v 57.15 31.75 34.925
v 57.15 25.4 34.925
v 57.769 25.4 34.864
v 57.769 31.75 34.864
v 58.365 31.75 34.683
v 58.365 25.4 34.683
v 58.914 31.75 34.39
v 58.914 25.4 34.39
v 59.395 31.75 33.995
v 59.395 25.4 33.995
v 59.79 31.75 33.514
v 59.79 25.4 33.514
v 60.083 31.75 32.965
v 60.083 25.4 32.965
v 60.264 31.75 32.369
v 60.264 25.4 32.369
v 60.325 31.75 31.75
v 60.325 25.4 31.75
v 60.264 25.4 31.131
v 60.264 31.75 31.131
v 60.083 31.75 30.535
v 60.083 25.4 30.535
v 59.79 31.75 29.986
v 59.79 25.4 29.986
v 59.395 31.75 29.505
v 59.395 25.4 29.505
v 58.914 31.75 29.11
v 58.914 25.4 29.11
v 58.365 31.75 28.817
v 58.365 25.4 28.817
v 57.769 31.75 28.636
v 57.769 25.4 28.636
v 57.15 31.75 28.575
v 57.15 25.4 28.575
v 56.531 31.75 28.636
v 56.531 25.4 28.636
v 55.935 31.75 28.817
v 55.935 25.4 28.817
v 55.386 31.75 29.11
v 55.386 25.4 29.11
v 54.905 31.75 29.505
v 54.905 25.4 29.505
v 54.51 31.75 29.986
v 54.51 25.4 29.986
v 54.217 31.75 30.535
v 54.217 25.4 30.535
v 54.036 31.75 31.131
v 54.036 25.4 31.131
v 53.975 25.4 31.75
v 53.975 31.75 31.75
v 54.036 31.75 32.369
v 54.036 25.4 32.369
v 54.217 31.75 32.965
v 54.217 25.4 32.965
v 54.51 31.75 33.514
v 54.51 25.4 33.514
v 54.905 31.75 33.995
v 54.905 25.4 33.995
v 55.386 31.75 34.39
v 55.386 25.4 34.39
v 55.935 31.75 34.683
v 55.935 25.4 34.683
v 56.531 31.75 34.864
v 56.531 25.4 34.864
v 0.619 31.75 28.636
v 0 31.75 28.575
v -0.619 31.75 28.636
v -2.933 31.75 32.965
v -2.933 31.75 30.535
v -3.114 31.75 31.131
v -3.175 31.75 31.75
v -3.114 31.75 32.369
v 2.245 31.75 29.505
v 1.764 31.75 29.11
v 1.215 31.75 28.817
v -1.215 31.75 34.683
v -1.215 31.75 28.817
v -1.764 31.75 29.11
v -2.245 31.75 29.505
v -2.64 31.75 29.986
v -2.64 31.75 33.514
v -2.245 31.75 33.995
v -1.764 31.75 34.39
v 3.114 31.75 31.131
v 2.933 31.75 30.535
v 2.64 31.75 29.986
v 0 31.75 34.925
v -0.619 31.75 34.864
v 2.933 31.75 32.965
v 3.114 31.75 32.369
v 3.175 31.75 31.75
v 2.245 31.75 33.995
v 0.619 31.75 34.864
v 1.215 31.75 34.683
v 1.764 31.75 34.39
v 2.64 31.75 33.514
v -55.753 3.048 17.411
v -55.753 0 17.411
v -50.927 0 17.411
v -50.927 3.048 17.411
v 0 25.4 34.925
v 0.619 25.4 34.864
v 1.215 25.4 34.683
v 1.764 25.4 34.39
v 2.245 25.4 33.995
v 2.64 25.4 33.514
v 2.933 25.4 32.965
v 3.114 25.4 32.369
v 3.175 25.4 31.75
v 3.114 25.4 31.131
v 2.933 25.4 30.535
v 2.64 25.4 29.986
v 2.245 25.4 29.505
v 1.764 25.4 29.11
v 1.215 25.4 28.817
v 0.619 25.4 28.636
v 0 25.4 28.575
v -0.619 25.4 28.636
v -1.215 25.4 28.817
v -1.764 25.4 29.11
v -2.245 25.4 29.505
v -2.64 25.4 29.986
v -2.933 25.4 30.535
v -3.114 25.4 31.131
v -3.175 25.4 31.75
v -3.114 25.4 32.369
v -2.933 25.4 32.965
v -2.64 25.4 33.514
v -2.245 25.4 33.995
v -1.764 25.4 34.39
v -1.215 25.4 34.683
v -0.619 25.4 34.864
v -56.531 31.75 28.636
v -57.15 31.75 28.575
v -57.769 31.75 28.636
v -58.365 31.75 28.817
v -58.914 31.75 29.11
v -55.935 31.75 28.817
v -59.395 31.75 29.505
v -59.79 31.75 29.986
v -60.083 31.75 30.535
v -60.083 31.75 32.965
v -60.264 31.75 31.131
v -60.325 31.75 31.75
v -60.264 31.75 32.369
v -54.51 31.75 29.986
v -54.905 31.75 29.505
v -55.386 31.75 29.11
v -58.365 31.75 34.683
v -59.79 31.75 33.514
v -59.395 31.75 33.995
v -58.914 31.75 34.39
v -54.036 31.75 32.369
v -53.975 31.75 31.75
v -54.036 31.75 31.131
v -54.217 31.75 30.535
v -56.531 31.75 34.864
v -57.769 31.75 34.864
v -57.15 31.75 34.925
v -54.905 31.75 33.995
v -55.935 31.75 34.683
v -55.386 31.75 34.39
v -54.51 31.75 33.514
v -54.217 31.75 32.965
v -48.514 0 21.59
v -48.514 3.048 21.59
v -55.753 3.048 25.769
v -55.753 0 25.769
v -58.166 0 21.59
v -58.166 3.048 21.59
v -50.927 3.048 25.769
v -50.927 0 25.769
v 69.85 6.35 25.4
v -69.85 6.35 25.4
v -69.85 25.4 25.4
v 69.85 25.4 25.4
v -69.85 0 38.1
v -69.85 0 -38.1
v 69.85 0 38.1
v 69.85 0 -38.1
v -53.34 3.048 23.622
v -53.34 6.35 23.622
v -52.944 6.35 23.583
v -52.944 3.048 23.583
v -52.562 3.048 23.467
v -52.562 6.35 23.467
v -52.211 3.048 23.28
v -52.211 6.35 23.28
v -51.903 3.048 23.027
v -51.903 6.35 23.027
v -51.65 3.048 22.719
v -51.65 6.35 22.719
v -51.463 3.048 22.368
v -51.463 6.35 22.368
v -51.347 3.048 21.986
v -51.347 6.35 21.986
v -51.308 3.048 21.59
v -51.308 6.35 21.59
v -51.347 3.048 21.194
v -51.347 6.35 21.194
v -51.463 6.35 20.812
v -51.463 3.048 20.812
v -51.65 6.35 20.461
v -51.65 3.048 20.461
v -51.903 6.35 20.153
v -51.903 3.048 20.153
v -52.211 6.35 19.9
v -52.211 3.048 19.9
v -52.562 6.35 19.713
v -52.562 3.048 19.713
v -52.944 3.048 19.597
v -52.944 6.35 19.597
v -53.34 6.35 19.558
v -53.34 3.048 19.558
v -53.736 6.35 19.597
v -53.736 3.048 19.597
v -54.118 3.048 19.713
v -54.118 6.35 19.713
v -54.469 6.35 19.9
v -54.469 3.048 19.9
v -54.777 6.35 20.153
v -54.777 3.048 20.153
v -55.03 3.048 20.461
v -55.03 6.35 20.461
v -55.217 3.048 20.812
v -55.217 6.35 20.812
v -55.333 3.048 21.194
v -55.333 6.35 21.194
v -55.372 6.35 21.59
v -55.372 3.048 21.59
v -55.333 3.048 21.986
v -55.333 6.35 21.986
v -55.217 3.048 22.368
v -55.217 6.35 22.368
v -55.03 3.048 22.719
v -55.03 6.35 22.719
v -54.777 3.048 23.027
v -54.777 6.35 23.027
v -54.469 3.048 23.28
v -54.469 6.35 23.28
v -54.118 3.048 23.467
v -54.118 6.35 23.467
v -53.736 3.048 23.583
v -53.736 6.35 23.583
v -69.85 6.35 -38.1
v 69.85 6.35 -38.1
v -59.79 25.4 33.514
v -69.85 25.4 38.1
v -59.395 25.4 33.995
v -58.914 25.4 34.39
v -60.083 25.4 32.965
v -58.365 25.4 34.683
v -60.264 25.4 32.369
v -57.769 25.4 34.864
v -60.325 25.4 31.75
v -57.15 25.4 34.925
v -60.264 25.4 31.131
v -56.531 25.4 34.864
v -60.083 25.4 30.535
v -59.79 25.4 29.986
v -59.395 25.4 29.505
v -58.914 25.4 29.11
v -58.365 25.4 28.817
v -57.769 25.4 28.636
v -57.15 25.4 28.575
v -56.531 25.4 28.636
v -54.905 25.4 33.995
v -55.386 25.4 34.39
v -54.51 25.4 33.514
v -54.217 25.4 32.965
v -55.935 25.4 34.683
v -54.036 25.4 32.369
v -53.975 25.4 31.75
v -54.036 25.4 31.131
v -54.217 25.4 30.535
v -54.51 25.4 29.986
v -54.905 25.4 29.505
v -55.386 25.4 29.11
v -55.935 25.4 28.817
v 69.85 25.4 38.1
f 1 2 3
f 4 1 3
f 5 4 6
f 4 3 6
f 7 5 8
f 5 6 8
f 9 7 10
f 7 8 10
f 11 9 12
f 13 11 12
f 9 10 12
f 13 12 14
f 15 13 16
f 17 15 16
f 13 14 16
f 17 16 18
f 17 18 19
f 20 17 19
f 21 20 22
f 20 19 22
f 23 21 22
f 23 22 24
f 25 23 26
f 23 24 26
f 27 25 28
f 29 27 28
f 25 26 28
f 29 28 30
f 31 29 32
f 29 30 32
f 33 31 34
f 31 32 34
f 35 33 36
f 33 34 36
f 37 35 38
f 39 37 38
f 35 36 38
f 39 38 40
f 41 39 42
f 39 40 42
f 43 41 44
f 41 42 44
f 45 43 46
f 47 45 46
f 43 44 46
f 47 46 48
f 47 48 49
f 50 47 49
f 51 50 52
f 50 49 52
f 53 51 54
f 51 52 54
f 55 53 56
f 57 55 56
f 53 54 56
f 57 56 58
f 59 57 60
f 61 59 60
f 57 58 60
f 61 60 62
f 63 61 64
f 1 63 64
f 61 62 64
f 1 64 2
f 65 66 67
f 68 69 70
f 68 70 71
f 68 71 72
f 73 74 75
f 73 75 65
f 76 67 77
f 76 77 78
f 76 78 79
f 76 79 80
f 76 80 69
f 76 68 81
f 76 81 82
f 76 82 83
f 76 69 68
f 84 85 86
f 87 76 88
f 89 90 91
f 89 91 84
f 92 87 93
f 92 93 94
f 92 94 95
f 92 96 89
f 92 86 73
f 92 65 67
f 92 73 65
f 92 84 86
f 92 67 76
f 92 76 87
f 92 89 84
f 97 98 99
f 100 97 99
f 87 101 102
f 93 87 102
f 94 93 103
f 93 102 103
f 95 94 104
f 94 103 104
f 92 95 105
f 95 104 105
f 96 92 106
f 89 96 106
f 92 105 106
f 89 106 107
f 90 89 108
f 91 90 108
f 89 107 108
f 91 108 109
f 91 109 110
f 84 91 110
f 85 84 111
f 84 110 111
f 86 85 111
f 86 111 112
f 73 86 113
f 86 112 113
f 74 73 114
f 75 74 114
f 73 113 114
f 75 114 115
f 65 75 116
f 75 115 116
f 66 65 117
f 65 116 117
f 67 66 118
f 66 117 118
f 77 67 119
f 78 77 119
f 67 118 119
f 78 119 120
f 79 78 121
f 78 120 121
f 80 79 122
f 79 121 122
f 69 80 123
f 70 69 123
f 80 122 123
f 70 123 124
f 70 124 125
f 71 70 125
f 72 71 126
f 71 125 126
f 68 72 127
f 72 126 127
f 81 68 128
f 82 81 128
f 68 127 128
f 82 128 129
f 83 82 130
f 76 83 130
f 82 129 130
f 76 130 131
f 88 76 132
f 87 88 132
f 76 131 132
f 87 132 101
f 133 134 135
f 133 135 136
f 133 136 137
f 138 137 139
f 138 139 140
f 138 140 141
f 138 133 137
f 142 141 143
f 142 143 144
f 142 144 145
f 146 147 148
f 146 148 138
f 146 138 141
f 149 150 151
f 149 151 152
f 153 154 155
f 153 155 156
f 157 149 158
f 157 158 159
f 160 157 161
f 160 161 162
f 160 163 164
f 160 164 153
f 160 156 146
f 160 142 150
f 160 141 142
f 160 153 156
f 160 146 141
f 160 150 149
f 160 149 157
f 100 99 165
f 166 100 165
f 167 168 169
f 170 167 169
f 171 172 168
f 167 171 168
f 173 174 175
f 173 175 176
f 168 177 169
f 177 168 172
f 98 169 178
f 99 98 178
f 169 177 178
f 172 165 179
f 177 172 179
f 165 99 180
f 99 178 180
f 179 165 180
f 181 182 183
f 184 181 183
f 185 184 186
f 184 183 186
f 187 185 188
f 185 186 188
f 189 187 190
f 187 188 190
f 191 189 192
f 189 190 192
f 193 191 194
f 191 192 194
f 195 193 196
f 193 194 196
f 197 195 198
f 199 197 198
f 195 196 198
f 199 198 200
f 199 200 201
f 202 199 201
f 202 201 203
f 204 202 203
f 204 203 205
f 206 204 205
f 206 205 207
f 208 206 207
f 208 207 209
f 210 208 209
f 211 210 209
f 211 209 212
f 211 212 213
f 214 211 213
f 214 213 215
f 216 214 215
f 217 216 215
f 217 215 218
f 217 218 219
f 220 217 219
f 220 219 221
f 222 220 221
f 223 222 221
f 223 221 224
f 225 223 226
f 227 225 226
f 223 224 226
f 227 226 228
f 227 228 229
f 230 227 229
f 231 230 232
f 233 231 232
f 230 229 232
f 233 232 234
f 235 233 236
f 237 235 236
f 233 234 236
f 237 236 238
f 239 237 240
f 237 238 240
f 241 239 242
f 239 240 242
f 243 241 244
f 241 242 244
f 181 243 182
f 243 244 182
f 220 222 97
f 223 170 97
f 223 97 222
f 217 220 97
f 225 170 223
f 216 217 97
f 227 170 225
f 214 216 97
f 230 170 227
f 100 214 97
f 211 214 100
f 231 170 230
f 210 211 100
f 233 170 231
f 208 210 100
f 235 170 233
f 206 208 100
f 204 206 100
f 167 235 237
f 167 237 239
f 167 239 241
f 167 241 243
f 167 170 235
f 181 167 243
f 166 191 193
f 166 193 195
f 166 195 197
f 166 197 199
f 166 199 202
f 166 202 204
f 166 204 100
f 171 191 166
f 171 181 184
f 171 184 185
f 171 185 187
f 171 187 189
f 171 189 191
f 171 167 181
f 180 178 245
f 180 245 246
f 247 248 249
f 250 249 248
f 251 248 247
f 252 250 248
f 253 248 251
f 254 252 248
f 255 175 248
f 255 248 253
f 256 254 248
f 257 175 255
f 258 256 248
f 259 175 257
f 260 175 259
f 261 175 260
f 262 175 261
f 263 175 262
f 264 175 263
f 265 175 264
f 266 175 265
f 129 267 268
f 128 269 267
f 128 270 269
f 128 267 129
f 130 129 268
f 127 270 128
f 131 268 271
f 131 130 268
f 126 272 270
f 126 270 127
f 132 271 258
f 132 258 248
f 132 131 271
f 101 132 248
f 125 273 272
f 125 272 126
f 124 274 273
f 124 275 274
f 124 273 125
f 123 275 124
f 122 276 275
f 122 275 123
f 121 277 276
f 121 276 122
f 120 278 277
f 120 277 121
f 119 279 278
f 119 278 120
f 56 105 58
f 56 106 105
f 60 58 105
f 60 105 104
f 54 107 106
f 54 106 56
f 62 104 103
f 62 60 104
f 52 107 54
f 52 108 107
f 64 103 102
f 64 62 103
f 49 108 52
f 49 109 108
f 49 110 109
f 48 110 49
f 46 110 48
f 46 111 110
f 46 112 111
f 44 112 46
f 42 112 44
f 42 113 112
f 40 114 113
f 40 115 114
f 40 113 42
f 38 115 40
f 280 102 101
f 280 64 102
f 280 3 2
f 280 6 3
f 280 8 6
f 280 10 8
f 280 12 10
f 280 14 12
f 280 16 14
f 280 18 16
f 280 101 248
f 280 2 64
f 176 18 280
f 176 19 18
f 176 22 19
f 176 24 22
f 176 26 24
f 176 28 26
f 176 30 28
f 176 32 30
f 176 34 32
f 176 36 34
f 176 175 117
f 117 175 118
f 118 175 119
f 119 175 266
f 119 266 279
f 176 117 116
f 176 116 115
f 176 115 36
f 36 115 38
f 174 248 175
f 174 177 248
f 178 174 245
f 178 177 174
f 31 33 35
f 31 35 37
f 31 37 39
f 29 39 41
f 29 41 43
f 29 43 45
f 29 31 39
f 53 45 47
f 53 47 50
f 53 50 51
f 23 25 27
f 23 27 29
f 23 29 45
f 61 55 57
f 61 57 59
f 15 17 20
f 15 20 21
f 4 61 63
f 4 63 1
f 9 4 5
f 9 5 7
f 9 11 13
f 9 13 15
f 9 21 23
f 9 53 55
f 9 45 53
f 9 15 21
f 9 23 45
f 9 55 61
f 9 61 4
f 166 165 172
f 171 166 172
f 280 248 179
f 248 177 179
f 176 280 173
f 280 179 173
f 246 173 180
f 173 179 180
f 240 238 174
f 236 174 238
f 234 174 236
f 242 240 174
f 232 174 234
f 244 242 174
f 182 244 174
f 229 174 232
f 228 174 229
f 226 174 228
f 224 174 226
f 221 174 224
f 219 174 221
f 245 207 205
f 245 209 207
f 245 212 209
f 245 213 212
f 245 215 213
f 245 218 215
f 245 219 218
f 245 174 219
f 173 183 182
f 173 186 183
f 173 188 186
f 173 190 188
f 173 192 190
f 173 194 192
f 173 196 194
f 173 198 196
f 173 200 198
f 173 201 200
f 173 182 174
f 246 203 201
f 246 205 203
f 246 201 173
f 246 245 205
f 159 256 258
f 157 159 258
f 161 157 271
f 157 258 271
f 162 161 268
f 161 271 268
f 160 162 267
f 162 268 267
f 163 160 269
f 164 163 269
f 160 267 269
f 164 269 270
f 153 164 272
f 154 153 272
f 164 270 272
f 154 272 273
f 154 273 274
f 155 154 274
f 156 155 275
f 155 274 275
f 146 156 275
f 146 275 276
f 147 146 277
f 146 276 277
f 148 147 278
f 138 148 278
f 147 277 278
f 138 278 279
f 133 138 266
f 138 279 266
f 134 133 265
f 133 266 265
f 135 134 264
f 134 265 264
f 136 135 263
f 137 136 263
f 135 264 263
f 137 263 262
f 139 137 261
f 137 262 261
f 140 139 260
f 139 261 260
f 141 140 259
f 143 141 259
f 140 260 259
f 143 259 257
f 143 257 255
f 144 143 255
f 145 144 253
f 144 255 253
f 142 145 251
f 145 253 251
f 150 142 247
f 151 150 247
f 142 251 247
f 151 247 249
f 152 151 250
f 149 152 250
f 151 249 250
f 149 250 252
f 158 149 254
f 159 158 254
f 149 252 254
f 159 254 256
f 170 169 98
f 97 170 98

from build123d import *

# Parameters (mm, degrees)
SKETCH1_W           = 139.7
SKETCH1_H           = 76.2
BOSS_EXTRUDE1_DEPTH = 6.35
SKETCH2_W           = 139.7
SKETCH2_H           = 12.7
BOSS_EXTRUDE2_DEPTH = 19.05
SKETCH3_R           = 2.032
CUT_EXTRUDE1_DEPTH  = 82.814026915
CUT_EXTRUDE2_DEPTH  = 3.048
SKETCH5_R           = 3.175
BOSS_EXTRUDE3_DEPTH = 6.35


with BuildPart() as part:
    # Sketch1 → Boss-Extrude1 (new body)
    with BuildSketch(Plane(origin=(0, 0, 0), x_dir=(1, 0, 0), z_dir=(0, 1, 0))):
        Rectangle(SKETCH1_W, SKETCH1_H)
    extrude(amount=BOSS_EXTRUDE1_DEPTH)

    # Sketch2 → Boss-Extrude2 (add)
    with BuildSketch(Plane(origin=(0, 6.35, 0), x_dir=(1, 0, 0), z_dir=(0, 1, 0))):
        with Locations((0, -31.75)):
            Rectangle(SKETCH2_W, SKETCH2_H)
    extrude(amount=BOSS_EXTRUDE2_DEPTH)

    # Sketch3 → Cut-Extrude1 (cut, through all)
    with BuildSketch(Plane(origin=(0, 6.35, 0), x_dir=(1, 0, 0), z_dir=(0, 1, 0))):
        with Locations(Location((-53.34, -21.59, 0), (0, 0, 270))):
            Circle(SKETCH3_R)
    extrude(amount=-CUT_EXTRUDE1_DEPTH, mode=Mode.SUBTRACT)

    # Sketch4 → Cut-Extrude2 (cut)
    with BuildSketch(Plane.XZ):
        Polygon((-50.927, 25.769438599), (-55.753, 25.769438599), (-58.166, 21.59), (-55.753, 17.410561401), (-50.927, 17.410561401), (-48.514, 21.59), align=None)
    extrude(amount=-CUT_EXTRUDE2_DEPTH, mode=Mode.SUBTRACT)

    # Sketch5 → Boss-Extrude3 (add)
    with BuildSketch(Plane(origin=(0, 25.4, 0), x_dir=(1, 0, 0), z_dir=(0, 1, 0))):
        with Locations(Location((-57.15, -31.75, 0), (0, 0, 270))):
            Circle(SKETCH5_R)
        with Locations(Location((0, -31.75, 0), (0, 0, 270))):
            Circle(SKETCH5_R)
        with Locations(Location((57.15, -31.75, 0), (0, 0, 270))):
            Circle(SKETCH5_R)
    extrude(amount=BOSS_EXTRUDE3_DEPTH)


solid = part.part
